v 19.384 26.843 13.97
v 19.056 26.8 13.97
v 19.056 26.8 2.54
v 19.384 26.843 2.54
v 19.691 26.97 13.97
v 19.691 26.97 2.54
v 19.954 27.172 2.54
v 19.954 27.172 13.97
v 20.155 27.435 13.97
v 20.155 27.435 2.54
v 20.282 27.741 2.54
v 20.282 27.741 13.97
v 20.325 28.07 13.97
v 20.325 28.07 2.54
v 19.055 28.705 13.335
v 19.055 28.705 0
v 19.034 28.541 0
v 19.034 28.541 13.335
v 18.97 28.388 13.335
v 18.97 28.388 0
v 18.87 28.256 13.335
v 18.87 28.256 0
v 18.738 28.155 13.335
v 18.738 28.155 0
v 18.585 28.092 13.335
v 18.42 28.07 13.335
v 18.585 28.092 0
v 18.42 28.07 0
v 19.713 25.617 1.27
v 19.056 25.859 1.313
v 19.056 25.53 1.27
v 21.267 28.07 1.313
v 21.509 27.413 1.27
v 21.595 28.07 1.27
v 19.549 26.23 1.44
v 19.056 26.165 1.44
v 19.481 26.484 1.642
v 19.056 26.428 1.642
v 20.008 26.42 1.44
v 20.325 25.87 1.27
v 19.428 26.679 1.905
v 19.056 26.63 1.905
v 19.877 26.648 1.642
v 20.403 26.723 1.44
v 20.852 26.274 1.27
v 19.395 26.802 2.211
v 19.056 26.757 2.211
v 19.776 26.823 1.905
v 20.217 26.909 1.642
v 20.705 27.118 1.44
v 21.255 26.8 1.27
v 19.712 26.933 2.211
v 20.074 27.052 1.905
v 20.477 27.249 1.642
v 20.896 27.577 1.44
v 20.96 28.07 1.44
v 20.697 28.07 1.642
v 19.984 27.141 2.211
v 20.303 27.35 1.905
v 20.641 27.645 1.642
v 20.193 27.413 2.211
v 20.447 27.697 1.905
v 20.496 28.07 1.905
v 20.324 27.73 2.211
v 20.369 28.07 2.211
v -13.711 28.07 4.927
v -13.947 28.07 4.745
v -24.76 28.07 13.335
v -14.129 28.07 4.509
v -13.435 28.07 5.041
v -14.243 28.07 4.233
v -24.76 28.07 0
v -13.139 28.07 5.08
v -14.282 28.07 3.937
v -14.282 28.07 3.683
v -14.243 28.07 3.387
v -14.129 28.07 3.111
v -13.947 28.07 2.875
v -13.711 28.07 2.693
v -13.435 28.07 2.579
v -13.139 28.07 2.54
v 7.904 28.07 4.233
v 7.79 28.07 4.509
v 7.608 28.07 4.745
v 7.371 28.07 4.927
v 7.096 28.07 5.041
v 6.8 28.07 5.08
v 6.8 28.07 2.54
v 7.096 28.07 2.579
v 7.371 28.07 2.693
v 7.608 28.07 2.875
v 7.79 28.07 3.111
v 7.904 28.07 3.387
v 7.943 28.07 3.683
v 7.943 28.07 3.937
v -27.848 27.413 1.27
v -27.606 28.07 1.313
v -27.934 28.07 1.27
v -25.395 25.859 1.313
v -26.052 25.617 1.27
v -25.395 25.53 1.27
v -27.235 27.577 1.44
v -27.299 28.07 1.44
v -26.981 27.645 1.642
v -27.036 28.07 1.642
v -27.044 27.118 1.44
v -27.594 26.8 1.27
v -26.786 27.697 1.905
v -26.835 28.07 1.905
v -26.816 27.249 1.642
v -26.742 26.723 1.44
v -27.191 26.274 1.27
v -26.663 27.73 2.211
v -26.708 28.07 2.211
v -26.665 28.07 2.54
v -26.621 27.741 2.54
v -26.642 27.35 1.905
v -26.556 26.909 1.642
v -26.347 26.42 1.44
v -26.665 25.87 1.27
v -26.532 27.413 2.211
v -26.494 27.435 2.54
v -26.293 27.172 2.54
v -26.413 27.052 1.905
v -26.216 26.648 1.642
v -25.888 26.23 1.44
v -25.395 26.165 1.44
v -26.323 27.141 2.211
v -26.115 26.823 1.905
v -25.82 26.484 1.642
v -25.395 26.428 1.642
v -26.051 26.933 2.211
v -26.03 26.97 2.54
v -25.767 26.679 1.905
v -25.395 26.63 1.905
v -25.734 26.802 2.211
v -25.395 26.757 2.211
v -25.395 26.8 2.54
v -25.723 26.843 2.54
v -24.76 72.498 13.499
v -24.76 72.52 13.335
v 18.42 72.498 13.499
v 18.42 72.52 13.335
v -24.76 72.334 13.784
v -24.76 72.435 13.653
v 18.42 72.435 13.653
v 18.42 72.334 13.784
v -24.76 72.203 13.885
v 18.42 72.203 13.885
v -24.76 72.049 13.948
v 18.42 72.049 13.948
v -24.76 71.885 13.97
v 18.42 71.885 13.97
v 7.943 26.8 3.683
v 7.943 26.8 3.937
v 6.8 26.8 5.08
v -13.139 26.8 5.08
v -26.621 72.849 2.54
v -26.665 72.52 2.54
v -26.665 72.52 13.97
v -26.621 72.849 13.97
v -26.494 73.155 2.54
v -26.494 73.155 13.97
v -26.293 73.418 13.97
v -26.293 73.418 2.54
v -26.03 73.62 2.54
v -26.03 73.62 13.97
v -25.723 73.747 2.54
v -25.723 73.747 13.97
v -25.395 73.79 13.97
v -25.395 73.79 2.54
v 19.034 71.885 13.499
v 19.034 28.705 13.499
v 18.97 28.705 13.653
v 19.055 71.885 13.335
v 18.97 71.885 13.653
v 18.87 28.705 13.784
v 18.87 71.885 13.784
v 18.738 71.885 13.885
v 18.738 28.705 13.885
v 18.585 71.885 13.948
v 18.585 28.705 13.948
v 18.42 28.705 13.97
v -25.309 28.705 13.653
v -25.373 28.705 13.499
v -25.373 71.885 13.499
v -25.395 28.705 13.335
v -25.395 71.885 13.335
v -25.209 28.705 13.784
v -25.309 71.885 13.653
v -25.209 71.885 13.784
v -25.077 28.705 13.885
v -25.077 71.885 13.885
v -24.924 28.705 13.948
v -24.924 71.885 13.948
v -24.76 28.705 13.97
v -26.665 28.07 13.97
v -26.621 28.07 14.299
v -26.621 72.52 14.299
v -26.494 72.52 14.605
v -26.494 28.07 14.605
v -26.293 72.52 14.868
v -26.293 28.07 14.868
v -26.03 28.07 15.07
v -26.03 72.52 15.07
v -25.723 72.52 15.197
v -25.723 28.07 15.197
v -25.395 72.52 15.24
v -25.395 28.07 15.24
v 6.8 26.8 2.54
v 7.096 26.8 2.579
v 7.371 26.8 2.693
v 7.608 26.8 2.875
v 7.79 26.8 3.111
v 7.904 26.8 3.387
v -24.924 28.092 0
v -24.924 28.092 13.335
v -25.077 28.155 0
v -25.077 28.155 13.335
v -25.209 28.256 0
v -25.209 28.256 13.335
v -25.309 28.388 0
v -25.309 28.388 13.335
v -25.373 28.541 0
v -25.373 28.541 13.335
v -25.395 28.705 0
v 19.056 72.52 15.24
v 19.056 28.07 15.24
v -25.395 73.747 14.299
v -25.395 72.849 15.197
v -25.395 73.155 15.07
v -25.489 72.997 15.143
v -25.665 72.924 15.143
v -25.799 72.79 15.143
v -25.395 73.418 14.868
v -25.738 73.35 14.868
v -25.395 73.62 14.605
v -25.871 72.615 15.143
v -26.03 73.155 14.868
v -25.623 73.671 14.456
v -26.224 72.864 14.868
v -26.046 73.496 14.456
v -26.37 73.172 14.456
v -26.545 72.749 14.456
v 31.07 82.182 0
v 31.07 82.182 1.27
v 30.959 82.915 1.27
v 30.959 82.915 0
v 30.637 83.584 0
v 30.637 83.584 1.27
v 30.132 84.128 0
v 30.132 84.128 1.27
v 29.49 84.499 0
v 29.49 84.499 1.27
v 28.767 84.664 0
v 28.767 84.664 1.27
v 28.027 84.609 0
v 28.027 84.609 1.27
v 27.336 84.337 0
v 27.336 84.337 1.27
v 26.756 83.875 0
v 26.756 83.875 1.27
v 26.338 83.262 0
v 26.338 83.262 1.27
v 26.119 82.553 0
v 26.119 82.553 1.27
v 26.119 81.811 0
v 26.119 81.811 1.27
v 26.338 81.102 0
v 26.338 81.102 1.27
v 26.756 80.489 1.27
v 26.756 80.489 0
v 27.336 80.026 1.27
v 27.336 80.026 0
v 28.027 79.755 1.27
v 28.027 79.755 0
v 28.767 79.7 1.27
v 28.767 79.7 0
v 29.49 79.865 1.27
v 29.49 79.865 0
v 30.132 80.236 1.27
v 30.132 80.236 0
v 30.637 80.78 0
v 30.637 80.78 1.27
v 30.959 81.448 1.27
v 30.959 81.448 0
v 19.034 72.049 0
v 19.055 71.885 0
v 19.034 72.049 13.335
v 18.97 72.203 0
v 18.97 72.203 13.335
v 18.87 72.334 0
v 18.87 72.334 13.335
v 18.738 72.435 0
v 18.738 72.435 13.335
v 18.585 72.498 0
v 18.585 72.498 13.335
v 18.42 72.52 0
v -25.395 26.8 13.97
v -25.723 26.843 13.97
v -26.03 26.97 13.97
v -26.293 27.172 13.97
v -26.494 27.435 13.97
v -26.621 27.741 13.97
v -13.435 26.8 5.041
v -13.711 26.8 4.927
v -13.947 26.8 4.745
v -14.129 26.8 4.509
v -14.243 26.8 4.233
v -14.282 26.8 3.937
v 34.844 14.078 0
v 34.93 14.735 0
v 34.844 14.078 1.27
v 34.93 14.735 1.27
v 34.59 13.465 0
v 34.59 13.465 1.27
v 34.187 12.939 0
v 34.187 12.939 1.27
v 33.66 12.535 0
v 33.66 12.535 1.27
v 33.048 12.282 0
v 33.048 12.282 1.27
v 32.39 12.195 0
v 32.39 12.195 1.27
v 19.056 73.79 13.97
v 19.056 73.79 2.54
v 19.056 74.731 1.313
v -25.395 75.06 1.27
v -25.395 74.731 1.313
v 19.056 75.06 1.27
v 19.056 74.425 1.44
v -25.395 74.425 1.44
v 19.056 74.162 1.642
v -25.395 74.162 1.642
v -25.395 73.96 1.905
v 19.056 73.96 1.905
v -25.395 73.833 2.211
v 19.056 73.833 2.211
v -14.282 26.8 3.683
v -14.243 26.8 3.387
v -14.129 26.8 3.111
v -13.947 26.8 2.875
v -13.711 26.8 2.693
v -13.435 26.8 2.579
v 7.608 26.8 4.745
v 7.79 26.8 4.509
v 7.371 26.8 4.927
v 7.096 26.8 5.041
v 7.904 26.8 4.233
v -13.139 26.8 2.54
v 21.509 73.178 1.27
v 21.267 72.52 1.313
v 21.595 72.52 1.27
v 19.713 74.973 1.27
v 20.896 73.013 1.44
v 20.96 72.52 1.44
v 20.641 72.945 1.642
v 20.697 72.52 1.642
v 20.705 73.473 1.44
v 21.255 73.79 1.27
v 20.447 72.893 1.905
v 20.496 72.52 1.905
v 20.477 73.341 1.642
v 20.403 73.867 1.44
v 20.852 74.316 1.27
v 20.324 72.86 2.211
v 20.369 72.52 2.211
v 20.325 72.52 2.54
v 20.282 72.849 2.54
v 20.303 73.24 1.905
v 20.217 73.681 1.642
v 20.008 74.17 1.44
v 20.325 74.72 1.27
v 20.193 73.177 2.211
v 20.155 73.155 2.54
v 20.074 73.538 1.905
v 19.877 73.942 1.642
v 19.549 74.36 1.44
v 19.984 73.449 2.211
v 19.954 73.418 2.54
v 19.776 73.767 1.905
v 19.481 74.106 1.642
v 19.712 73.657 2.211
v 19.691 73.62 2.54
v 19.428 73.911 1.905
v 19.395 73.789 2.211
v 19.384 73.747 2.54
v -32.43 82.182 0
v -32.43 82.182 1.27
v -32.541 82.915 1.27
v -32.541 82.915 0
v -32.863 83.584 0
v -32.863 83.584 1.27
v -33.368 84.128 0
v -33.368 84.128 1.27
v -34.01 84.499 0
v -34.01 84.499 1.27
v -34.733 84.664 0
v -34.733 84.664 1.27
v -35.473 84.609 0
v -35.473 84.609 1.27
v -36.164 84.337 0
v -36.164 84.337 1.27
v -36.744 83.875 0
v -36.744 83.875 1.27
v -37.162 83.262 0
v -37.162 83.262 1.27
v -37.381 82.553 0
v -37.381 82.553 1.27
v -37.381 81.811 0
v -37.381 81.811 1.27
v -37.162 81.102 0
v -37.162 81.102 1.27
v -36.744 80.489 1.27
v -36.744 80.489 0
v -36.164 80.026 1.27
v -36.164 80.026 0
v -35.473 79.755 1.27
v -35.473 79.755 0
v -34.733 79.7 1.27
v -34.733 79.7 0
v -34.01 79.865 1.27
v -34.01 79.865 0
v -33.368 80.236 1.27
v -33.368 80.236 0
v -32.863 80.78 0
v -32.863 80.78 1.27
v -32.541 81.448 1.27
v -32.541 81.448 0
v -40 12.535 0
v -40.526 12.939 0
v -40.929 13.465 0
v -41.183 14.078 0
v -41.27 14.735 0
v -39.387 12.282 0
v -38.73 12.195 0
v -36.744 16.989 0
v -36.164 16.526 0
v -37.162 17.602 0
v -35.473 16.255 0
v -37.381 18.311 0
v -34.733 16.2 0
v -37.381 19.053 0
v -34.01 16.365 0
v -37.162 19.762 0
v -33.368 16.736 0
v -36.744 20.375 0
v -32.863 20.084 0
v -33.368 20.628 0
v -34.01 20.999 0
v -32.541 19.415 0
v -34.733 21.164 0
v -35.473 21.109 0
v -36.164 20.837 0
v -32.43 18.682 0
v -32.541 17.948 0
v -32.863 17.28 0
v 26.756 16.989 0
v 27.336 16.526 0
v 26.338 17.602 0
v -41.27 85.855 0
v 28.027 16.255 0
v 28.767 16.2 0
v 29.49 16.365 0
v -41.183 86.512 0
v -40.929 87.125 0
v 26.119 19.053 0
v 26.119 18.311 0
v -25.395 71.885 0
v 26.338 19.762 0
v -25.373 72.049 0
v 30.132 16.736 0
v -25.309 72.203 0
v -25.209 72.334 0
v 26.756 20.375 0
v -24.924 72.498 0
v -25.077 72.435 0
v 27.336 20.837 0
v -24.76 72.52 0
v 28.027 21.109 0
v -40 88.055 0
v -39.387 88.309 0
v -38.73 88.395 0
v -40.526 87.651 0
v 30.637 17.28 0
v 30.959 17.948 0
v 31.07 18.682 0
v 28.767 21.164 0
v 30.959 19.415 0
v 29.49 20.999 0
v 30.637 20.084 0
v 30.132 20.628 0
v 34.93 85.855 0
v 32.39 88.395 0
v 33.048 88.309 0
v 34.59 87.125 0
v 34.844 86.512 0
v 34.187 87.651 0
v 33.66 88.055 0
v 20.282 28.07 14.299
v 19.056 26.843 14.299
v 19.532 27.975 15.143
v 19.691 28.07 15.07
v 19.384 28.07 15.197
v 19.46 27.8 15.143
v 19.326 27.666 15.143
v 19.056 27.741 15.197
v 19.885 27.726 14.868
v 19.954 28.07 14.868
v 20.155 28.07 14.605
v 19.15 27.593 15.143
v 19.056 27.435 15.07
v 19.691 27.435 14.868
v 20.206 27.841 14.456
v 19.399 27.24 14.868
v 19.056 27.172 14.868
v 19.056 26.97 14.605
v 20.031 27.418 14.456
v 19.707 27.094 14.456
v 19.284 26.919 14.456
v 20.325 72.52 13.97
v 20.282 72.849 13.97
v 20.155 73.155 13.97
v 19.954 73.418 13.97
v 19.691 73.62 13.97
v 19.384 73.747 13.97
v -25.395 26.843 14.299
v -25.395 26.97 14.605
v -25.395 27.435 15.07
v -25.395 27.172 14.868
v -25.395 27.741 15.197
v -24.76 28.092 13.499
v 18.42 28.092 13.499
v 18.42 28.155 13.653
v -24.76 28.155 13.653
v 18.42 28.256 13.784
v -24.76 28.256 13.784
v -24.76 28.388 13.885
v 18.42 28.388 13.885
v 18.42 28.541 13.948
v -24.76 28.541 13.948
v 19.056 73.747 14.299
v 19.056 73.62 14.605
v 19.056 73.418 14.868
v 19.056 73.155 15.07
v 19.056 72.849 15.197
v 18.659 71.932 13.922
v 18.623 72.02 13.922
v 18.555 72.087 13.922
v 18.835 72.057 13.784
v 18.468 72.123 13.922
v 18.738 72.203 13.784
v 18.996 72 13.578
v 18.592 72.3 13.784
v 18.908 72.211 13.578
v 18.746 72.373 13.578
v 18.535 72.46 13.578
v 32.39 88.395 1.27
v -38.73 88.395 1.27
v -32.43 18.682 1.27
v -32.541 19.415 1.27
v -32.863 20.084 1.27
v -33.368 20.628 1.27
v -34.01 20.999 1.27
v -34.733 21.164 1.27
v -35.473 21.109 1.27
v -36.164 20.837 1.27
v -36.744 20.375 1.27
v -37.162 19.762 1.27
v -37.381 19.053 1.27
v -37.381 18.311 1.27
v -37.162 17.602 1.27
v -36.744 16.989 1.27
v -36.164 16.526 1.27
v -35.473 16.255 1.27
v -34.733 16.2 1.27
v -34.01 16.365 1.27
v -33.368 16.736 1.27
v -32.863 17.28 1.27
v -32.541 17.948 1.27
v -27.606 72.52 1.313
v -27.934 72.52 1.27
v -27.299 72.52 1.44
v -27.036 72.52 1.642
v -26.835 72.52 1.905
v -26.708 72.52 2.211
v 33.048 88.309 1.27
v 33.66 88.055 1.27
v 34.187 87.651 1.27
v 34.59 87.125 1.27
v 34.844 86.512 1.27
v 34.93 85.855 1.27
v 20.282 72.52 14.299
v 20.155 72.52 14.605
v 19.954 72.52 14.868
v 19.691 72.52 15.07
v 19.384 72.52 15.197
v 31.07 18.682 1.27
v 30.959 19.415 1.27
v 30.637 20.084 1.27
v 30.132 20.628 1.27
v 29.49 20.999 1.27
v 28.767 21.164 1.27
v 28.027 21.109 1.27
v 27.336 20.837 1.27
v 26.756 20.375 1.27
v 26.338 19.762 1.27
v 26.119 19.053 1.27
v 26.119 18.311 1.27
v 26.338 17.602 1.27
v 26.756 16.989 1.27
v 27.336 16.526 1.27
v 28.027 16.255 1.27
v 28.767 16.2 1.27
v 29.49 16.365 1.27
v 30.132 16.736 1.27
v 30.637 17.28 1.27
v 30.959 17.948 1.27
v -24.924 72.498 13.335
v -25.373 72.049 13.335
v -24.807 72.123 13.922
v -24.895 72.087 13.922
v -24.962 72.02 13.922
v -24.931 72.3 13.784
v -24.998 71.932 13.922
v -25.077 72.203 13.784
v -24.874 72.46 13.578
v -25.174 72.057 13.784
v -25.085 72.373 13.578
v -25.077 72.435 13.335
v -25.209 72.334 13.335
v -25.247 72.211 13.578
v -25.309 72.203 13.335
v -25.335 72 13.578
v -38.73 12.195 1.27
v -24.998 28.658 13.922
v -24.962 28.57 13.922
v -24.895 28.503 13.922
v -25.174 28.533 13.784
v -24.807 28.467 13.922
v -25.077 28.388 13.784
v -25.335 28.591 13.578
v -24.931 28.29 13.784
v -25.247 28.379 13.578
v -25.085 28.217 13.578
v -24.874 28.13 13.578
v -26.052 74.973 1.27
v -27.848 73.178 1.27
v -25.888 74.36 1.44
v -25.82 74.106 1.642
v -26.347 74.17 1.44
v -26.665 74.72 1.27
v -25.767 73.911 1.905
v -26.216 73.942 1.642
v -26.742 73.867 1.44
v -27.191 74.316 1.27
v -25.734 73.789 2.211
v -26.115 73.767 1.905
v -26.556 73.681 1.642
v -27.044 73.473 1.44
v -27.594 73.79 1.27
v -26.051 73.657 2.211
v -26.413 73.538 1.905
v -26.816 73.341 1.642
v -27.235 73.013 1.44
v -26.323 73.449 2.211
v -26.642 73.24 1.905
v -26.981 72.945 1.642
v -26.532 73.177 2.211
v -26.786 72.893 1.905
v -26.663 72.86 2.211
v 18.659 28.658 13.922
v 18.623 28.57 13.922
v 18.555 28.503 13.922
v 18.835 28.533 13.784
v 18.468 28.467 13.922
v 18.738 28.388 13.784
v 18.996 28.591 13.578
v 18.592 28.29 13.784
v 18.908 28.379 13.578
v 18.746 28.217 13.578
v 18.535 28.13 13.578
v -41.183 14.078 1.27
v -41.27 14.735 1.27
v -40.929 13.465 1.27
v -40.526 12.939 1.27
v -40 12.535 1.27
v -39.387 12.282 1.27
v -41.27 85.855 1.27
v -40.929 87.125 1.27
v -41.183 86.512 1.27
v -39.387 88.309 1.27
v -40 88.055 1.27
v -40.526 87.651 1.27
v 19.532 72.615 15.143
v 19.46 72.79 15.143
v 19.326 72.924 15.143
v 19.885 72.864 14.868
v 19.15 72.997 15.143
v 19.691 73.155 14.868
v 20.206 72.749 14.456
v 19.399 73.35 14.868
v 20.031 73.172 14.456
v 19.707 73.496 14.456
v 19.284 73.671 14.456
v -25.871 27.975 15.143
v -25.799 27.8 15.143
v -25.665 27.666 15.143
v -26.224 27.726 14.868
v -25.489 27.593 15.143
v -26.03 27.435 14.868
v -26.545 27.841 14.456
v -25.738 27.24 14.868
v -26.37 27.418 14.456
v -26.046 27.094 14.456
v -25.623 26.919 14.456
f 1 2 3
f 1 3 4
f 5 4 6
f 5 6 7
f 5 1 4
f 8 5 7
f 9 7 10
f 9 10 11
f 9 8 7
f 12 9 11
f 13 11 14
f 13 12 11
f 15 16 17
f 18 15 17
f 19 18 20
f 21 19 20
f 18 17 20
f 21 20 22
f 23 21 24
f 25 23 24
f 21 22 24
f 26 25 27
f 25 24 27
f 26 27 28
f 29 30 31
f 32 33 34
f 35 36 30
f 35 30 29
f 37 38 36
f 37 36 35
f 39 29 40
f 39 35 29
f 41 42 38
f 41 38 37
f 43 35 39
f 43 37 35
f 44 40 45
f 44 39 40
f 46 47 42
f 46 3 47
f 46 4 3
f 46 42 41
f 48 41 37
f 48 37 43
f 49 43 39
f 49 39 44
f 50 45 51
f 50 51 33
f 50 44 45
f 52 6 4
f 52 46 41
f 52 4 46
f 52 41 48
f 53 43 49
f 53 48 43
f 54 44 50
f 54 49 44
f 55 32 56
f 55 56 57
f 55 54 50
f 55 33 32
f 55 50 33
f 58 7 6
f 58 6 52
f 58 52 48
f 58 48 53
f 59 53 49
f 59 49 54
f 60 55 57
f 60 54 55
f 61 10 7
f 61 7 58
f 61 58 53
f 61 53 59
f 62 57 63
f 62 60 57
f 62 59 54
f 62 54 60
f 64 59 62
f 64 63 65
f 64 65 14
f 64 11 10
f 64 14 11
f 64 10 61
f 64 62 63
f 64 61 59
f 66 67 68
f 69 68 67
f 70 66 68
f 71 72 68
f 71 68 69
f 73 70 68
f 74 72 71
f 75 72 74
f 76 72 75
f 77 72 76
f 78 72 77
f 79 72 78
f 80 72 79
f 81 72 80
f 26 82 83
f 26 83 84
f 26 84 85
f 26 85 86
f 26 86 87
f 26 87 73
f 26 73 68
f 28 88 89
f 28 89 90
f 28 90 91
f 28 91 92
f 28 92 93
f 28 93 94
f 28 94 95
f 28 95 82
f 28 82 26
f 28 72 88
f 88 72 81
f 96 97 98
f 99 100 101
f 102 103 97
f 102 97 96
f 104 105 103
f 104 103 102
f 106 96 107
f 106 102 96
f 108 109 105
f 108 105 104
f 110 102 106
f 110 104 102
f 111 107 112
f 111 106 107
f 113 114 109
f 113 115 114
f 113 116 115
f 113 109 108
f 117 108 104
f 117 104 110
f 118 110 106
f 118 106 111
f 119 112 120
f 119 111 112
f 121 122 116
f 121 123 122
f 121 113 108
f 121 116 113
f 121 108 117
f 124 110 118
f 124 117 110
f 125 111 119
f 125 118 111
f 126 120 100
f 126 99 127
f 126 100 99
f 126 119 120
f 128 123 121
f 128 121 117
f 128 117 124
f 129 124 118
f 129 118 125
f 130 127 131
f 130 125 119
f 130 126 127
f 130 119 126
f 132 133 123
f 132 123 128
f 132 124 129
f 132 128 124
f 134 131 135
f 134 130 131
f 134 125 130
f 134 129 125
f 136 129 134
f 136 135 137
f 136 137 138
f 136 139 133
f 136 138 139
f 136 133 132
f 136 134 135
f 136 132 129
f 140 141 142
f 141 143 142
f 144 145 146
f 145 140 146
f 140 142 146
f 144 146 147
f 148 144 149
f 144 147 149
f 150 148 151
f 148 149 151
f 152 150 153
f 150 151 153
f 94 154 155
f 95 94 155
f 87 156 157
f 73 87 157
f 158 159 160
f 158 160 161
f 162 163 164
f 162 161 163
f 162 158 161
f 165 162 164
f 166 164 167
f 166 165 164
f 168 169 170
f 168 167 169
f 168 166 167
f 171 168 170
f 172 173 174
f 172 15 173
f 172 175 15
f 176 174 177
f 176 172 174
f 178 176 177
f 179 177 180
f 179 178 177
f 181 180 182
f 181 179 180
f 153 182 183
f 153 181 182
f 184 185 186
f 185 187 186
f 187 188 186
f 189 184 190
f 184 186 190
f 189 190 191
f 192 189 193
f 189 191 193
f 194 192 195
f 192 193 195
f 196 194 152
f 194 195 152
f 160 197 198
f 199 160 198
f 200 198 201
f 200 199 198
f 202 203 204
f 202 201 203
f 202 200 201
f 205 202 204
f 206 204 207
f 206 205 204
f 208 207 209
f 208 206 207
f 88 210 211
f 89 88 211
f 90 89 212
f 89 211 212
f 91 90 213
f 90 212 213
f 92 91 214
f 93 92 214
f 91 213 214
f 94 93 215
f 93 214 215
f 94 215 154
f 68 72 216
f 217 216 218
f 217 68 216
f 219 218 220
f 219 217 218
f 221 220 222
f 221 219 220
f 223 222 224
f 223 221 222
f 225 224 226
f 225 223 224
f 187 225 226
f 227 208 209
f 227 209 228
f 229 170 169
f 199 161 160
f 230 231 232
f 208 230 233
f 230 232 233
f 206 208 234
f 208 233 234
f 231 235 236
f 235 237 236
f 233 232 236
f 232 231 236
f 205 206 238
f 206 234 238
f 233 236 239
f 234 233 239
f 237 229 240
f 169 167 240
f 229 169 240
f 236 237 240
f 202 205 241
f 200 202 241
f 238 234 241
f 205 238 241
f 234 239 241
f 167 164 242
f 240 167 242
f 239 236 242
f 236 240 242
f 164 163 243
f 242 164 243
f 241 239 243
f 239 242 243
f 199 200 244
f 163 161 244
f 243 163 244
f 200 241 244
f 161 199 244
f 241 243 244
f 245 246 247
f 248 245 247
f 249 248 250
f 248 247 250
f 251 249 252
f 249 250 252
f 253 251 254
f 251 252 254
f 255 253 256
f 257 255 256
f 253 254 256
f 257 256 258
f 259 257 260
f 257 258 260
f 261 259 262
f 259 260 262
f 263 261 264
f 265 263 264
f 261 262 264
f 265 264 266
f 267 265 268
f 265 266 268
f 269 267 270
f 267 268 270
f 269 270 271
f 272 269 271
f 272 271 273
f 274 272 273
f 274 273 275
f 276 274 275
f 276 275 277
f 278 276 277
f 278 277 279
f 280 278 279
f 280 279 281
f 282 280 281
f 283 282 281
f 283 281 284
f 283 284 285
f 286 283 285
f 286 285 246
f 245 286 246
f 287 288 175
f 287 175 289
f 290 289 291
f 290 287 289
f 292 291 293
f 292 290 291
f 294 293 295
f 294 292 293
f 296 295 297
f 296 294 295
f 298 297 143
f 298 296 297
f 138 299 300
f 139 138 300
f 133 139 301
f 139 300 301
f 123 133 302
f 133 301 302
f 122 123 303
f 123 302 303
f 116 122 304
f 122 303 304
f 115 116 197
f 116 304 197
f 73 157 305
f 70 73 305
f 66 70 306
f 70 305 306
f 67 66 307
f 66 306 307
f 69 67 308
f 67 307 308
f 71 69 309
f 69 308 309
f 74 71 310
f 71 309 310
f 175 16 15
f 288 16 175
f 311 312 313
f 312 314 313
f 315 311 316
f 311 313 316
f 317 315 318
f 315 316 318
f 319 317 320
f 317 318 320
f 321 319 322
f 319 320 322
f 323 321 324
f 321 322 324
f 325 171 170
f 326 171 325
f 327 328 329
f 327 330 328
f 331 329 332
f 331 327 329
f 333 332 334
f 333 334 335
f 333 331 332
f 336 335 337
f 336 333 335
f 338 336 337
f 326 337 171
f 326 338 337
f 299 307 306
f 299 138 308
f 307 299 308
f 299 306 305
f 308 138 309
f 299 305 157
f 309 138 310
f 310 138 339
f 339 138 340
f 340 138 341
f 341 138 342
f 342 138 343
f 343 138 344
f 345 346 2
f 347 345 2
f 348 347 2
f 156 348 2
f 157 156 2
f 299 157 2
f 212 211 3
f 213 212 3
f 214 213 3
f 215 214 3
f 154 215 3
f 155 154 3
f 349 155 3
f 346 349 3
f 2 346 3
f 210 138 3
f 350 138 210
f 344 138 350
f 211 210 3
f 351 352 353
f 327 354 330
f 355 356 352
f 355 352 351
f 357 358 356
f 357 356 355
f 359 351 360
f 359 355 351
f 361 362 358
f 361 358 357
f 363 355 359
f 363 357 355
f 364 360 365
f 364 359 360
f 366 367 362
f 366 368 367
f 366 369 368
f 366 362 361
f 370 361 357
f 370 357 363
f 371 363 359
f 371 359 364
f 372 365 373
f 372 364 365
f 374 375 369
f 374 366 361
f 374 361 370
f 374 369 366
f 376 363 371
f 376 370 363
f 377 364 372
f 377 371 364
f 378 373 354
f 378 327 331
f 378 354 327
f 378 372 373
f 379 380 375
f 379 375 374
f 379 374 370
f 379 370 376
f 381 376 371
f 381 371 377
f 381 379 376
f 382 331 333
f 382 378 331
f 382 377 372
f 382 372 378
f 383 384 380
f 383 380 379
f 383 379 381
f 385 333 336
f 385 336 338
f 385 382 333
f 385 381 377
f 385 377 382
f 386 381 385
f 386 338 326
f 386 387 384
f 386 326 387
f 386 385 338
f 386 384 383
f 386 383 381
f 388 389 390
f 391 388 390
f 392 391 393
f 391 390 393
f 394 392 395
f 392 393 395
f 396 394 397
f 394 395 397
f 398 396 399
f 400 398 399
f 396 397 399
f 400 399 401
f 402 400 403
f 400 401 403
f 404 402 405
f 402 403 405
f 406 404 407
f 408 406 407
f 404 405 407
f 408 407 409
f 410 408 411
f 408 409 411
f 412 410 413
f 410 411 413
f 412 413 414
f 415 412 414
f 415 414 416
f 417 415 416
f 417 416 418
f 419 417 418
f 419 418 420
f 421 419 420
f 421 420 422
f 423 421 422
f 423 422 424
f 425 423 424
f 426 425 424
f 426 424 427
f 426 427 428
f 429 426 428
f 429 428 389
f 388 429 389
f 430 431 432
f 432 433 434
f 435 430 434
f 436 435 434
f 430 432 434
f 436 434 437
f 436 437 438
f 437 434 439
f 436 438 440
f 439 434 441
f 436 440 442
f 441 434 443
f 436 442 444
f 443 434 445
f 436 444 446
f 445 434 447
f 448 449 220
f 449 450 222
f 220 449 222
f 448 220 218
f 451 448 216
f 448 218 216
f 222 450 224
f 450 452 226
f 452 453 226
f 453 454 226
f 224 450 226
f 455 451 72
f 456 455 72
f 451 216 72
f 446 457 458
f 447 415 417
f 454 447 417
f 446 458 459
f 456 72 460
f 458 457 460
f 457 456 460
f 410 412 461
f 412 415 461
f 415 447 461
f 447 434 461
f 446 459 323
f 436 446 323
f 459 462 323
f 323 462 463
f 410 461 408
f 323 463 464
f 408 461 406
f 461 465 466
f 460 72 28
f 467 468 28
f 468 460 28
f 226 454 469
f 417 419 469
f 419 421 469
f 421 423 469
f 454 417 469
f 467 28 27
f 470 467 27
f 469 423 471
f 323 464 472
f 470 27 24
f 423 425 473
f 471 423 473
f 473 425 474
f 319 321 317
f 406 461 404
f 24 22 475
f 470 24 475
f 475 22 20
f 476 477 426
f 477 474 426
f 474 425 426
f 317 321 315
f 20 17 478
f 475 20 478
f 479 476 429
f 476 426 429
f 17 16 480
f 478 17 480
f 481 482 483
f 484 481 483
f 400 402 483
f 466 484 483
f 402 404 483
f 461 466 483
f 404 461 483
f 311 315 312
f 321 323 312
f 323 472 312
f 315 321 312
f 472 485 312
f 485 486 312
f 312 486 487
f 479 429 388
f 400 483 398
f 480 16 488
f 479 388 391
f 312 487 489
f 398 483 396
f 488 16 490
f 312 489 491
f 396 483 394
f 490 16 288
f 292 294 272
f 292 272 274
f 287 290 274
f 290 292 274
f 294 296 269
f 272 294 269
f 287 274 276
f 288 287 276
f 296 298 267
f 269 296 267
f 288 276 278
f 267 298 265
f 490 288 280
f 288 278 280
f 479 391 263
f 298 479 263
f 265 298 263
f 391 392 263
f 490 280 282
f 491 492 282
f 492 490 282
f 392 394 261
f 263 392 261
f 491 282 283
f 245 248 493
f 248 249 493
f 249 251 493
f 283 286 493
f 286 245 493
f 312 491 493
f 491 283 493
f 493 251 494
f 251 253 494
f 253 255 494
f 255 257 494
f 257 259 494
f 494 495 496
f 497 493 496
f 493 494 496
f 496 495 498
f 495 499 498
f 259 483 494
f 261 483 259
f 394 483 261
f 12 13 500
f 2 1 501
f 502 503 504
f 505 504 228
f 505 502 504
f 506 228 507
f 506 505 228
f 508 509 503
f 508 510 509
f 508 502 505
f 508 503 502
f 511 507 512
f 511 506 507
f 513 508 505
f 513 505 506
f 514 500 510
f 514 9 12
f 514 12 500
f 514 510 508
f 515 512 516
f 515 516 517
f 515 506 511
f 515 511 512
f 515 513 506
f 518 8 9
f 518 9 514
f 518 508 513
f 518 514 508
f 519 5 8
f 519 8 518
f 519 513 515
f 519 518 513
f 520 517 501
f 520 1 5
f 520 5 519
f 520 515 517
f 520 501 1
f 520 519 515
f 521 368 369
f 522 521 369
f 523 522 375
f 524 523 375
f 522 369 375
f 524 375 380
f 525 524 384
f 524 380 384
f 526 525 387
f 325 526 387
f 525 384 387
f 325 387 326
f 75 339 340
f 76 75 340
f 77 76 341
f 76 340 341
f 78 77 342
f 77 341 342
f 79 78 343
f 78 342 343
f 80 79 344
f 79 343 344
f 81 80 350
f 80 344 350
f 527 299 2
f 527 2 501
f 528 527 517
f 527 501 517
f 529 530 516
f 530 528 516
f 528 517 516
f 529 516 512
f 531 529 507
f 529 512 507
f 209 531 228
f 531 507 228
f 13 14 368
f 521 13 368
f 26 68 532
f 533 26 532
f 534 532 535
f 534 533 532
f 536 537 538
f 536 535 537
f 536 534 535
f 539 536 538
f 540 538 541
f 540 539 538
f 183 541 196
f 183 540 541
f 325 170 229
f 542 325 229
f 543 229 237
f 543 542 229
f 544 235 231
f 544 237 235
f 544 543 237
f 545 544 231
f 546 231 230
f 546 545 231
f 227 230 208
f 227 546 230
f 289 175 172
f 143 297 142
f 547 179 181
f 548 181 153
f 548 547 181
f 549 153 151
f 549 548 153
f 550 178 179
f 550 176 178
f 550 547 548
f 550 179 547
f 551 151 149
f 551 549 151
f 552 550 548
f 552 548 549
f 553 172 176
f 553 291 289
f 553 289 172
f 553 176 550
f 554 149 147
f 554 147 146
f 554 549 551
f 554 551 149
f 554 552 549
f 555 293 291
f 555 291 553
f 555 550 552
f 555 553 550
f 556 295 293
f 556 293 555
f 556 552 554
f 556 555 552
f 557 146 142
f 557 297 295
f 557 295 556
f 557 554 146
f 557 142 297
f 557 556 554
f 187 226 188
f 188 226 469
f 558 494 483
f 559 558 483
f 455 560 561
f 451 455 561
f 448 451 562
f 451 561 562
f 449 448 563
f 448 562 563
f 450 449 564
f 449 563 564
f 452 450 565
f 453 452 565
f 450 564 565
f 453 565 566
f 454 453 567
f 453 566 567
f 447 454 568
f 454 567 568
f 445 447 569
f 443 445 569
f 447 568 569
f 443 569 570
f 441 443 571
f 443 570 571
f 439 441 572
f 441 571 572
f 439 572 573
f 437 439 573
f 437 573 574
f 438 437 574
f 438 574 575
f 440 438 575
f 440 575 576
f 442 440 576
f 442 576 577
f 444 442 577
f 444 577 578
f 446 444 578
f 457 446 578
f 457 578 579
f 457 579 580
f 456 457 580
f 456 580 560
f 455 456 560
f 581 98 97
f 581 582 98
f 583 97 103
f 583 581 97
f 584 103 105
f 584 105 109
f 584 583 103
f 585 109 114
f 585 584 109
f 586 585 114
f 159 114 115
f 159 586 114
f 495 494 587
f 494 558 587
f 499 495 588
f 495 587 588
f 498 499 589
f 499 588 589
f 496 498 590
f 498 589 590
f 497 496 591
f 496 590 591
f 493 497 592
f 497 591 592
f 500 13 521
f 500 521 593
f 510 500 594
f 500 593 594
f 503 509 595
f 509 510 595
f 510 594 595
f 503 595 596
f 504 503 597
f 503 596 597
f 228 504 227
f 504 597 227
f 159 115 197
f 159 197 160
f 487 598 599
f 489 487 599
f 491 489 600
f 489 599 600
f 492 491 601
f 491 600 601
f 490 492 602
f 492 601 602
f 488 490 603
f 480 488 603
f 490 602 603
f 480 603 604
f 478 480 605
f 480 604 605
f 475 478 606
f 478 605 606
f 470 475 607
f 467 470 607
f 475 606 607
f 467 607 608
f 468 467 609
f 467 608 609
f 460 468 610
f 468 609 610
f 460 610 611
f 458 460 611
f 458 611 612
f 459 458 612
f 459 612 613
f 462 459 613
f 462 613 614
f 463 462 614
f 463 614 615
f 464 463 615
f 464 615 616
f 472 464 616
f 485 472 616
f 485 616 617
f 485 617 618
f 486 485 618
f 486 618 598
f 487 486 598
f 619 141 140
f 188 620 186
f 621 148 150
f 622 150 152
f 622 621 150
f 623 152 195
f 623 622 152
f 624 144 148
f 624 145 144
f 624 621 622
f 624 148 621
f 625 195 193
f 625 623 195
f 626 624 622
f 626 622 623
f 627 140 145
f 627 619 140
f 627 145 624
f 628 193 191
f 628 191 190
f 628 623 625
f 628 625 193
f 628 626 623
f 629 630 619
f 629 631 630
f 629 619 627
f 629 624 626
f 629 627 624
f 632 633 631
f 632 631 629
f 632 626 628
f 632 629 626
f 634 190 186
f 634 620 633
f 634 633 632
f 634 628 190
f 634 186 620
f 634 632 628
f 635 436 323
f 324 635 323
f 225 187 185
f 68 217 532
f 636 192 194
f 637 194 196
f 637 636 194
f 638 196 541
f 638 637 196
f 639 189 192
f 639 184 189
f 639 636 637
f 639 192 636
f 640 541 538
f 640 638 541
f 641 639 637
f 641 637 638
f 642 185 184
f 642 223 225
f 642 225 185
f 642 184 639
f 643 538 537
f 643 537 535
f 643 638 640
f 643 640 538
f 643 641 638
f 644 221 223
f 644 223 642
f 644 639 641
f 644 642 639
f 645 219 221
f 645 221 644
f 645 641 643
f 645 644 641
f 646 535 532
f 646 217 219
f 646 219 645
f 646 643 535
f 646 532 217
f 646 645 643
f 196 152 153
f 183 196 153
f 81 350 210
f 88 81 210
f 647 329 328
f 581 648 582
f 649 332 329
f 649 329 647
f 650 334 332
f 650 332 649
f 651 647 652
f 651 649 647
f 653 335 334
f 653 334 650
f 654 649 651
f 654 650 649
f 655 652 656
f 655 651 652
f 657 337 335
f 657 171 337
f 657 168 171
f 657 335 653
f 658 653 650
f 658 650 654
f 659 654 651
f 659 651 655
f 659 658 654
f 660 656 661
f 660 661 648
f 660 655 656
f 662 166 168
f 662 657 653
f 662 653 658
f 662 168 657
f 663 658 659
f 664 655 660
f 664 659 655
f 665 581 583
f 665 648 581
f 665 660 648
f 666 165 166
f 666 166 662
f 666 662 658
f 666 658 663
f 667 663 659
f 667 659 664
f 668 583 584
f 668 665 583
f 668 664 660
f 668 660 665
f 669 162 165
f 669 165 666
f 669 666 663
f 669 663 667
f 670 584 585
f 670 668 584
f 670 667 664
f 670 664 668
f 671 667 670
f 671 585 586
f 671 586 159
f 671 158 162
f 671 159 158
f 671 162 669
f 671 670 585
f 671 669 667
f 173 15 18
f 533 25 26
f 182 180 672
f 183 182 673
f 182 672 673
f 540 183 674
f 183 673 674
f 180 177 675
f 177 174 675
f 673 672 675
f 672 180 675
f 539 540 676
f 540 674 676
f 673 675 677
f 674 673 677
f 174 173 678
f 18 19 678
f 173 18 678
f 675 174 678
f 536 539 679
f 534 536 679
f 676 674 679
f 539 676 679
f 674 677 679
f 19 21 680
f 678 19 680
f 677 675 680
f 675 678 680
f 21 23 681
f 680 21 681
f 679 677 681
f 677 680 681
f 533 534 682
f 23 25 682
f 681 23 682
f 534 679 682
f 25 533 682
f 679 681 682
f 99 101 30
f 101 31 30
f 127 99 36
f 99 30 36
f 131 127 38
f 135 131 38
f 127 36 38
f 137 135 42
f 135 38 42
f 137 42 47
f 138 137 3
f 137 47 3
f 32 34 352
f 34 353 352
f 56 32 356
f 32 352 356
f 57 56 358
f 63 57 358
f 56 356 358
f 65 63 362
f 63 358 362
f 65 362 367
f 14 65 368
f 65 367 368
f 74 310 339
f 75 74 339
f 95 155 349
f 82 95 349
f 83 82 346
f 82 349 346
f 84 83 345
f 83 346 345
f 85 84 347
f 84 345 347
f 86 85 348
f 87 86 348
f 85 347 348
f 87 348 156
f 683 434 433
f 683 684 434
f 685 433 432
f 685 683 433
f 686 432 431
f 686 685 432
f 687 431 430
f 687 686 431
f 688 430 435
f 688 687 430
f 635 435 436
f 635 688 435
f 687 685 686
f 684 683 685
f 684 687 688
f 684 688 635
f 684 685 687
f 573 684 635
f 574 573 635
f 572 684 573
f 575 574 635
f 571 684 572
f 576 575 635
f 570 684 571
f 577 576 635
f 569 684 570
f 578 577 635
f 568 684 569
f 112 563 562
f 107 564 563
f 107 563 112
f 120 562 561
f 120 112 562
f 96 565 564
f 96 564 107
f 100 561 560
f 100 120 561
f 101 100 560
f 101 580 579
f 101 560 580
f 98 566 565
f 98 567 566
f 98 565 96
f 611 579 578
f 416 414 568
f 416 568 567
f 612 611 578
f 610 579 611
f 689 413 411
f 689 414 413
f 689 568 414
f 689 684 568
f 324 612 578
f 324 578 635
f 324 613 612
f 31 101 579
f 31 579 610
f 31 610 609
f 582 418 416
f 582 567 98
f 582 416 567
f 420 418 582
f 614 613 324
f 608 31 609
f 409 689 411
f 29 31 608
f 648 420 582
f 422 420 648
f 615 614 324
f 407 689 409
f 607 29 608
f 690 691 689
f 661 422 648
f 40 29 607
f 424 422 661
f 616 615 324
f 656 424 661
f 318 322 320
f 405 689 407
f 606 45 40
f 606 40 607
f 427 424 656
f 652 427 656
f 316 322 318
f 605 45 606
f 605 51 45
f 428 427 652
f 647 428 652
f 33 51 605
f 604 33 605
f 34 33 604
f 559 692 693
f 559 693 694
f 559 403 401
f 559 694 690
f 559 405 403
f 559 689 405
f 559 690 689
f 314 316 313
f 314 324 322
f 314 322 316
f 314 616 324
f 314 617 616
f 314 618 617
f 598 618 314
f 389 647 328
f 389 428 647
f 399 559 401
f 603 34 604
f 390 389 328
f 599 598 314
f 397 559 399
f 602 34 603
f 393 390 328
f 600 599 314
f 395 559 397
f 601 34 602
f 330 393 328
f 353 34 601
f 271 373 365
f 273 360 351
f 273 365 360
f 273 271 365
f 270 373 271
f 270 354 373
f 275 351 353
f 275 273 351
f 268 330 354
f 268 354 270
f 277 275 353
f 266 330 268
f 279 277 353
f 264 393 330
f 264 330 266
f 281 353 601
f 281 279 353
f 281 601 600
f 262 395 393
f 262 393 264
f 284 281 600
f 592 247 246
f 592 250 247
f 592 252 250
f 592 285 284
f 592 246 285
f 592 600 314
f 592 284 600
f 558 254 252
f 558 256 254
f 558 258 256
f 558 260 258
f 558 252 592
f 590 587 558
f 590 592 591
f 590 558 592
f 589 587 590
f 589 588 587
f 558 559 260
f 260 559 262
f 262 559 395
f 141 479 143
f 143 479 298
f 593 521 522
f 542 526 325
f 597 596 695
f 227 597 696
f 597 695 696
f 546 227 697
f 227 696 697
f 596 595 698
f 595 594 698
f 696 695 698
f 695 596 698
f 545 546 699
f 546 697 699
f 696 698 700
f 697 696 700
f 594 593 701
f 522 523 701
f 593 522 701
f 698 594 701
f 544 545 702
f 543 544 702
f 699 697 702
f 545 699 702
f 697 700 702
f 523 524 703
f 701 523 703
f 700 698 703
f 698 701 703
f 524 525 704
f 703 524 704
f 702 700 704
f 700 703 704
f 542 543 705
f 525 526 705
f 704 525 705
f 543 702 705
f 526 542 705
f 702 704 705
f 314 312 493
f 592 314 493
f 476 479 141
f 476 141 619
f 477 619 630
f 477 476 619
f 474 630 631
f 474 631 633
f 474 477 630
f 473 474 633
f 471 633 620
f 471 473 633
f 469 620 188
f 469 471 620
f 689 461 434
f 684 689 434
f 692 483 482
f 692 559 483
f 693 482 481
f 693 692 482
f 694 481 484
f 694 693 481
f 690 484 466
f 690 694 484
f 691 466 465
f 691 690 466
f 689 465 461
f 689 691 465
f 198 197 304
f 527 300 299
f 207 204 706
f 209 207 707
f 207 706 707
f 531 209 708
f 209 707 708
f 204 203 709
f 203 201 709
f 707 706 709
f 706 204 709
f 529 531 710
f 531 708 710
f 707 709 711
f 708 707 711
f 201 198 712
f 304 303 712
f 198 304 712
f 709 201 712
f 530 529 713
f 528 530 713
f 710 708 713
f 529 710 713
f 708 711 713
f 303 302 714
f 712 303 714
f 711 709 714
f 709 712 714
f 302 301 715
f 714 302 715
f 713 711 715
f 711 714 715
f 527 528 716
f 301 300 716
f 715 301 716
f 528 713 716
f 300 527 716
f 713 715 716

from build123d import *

# Parameters (mm, degrees)
BOSS_EXTRUDE1_DEPTH    = 1.27
SKETCH2_W              = 46.99
SKETCH2_H              = 46.99
SKETCH2_W_2            = 44.45
SKETCH2_H_2            = 44.45
BOSS_EXTRUDE2_DEPTH    = 12.7
SKETCH3_W              = 46.99
SKETCH3_H              = 46.99
BOSS_EXTRUDE3_DEPTH    = 1.27
CUT_EXTRUDE1_DEPTH     = 1.27
F_10_CLEARANCE_HOLE1_D = 4.9784
FILLET1_R              = 2.54
FILLET2_R              = 1.27
FILLET3_R              = 0.635


with BuildPart() as part:
    # Sketch1 → Boss-Extrude1 (new body)
    with BuildSketch(Plane.XY):
        Polygon((34.930491901, 50.295089045), (34.930491901, 88.395089045), (-41.269508099, 88.395089045), (-41.269508099, 12.195089045), (34.930491901, 12.195089045), align=None)
        Polygon((19.055491901, 50.295089045), (19.055491901, 72.520089045), (-25.394508099, 72.520089045), (-25.394508099, 28.070089045), (19.055491901, 28.070089045), align=None, mode=Mode.SUBTRACT)
    extrude(amount=BOSS_EXTRUDE1_DEPTH)

    # Sketch2 → Boss-Extrude2 (add)
    with BuildSketch(Plane.XY.offset(1.27)):
        with Locations((-3.169508099, 50.295089045)):
            Rectangle(SKETCH2_W, SKETCH2_H)
        with Locations((-3.169508099, 50.295089045)):
            Rectangle(SKETCH2_W_2, SKETCH2_H_2, mode=Mode.SUBTRACT)
    extrude(amount=BOSS_EXTRUDE2_DEPTH)

    # Sketch3 → Boss-Extrude3 (add)
    with BuildSketch(Plane.XY.offset(13.97)):
        with Locations((-3.169508099, 50.295089045)):
            Rectangle(SKETCH3_W, SKETCH3_H)
    extrude(amount=BOSS_EXTRUDE3_DEPTH)

    # Sketch4 → Cut-Extrude1 (cut)
    with BuildSketch(Plane.XZ.offset(-26.800089045)):
        with BuildLine():
            Line((-3.169508099, 2.54), (6.799991901, 2.54))
            ThreePointArc((6.799991901, 2.54), (7.608214952, 2.874776949), (7.942991901, 3.683))
            Line((7.942991901, 3.683), (7.942991901, 3.937))
            ThreePointArc((7.942991901, 3.937), (7.608214952, 4.745223051), (6.799991901, 5.08))
            Line((6.799991901, 5.08), (-13.139008099, 5.08))
            ThreePointArc((-13.139008099, 5.08), (-13.94723115, 4.745223051), (-14.282008099, 3.937))
            Line((-14.282008099, 3.937), (-14.282008099, 3.683))
            ThreePointArc((-14.282008099, 3.683), (-13.94723115, 2.874776949), (-13.139008099, 2.54))
            Line((-13.139008099, 2.54), (-3.169508099, 2.54))
        make_face()
    extrude(amount=-CUT_EXTRUDE1_DEPTH, mode=Mode.SUBTRACT)

    # #10 Clearance Hole1 (through all)
    with Locations(Plane(origin=(0, 0, 0), x_dir=(-1, 0, 0), z_dir=(0, 0, -1))):
        with Locations((-28.580491901, 82.181775554), (34.919508099, 82.181775554), (34.919508099, 18.681775554), (-28.580491901, 18.681775554)):
            Hole(F_10_CLEARANCE_HOLE1_D / 2)

    # Fillet1
    fillet1_edges = [part.edges().sort_by_distance(p)[0] for p in [
        (34.930491901, 12.195089045, 0.635),
        (-41.269508099, 12.195089045, 0.635),
        (-41.269508099, 88.395089045, 0.635),
        (34.930491901, 88.395089045, 0.635),
    ]]
    fillet(fillet1_edges, radius=FILLET1_R)

    # Fillet2
    fillet2_edges = [part.edges().sort_by_distance(p)[0] for p in [
        (-3.169508099, 73.790089045, 1.27),
        (20.325491901, 73.790089045, 8.255),
        (-26.664508099, 50.295089045, 1.27),
        (-26.664508099, 73.790089045, 8.255),
        (-3.169508099, 26.800089045, 1.27),
        (-26.664508099, 26.800089045, 8.255),
        (20.325491901, 50.295089045, 1.27),
        (20.325491901, 26.800089045, 8.255),
        (20.325491901, 50.295089045, 15.24),
        (-3.169508099, 73.790089045, 15.24),
        (-26.664508099, 50.295089045, 15.24),
        (-3.169508099, 26.800089045, 15.24),
    ]]
    fillet(fillet2_edges, radius=FILLET2_R - 0.0001)  # a hair under: the kernel refuses the full size

    # Fillet3
    fillet3_edges = [part.edges().sort_by_distance(p)[0] for p in [
        (19.055491901, 28.070089045, 6.985),
        (19.055491901, 72.520089045, 6.985),
        (-25.394508099, 72.520089045, 6.985),
        (-25.394508099, 28.070089045, 6.985),
        (19.055491901, 50.295089045, 13.97),
        (-3.169508099, 72.520089045, 13.97),
        (-25.394508099, 50.295089045, 13.97),
        (-3.169508099, 28.070089045, 13.97),
    ]]
    fillet(fillet3_edges, radius=FILLET3_R)


solid = part.part
